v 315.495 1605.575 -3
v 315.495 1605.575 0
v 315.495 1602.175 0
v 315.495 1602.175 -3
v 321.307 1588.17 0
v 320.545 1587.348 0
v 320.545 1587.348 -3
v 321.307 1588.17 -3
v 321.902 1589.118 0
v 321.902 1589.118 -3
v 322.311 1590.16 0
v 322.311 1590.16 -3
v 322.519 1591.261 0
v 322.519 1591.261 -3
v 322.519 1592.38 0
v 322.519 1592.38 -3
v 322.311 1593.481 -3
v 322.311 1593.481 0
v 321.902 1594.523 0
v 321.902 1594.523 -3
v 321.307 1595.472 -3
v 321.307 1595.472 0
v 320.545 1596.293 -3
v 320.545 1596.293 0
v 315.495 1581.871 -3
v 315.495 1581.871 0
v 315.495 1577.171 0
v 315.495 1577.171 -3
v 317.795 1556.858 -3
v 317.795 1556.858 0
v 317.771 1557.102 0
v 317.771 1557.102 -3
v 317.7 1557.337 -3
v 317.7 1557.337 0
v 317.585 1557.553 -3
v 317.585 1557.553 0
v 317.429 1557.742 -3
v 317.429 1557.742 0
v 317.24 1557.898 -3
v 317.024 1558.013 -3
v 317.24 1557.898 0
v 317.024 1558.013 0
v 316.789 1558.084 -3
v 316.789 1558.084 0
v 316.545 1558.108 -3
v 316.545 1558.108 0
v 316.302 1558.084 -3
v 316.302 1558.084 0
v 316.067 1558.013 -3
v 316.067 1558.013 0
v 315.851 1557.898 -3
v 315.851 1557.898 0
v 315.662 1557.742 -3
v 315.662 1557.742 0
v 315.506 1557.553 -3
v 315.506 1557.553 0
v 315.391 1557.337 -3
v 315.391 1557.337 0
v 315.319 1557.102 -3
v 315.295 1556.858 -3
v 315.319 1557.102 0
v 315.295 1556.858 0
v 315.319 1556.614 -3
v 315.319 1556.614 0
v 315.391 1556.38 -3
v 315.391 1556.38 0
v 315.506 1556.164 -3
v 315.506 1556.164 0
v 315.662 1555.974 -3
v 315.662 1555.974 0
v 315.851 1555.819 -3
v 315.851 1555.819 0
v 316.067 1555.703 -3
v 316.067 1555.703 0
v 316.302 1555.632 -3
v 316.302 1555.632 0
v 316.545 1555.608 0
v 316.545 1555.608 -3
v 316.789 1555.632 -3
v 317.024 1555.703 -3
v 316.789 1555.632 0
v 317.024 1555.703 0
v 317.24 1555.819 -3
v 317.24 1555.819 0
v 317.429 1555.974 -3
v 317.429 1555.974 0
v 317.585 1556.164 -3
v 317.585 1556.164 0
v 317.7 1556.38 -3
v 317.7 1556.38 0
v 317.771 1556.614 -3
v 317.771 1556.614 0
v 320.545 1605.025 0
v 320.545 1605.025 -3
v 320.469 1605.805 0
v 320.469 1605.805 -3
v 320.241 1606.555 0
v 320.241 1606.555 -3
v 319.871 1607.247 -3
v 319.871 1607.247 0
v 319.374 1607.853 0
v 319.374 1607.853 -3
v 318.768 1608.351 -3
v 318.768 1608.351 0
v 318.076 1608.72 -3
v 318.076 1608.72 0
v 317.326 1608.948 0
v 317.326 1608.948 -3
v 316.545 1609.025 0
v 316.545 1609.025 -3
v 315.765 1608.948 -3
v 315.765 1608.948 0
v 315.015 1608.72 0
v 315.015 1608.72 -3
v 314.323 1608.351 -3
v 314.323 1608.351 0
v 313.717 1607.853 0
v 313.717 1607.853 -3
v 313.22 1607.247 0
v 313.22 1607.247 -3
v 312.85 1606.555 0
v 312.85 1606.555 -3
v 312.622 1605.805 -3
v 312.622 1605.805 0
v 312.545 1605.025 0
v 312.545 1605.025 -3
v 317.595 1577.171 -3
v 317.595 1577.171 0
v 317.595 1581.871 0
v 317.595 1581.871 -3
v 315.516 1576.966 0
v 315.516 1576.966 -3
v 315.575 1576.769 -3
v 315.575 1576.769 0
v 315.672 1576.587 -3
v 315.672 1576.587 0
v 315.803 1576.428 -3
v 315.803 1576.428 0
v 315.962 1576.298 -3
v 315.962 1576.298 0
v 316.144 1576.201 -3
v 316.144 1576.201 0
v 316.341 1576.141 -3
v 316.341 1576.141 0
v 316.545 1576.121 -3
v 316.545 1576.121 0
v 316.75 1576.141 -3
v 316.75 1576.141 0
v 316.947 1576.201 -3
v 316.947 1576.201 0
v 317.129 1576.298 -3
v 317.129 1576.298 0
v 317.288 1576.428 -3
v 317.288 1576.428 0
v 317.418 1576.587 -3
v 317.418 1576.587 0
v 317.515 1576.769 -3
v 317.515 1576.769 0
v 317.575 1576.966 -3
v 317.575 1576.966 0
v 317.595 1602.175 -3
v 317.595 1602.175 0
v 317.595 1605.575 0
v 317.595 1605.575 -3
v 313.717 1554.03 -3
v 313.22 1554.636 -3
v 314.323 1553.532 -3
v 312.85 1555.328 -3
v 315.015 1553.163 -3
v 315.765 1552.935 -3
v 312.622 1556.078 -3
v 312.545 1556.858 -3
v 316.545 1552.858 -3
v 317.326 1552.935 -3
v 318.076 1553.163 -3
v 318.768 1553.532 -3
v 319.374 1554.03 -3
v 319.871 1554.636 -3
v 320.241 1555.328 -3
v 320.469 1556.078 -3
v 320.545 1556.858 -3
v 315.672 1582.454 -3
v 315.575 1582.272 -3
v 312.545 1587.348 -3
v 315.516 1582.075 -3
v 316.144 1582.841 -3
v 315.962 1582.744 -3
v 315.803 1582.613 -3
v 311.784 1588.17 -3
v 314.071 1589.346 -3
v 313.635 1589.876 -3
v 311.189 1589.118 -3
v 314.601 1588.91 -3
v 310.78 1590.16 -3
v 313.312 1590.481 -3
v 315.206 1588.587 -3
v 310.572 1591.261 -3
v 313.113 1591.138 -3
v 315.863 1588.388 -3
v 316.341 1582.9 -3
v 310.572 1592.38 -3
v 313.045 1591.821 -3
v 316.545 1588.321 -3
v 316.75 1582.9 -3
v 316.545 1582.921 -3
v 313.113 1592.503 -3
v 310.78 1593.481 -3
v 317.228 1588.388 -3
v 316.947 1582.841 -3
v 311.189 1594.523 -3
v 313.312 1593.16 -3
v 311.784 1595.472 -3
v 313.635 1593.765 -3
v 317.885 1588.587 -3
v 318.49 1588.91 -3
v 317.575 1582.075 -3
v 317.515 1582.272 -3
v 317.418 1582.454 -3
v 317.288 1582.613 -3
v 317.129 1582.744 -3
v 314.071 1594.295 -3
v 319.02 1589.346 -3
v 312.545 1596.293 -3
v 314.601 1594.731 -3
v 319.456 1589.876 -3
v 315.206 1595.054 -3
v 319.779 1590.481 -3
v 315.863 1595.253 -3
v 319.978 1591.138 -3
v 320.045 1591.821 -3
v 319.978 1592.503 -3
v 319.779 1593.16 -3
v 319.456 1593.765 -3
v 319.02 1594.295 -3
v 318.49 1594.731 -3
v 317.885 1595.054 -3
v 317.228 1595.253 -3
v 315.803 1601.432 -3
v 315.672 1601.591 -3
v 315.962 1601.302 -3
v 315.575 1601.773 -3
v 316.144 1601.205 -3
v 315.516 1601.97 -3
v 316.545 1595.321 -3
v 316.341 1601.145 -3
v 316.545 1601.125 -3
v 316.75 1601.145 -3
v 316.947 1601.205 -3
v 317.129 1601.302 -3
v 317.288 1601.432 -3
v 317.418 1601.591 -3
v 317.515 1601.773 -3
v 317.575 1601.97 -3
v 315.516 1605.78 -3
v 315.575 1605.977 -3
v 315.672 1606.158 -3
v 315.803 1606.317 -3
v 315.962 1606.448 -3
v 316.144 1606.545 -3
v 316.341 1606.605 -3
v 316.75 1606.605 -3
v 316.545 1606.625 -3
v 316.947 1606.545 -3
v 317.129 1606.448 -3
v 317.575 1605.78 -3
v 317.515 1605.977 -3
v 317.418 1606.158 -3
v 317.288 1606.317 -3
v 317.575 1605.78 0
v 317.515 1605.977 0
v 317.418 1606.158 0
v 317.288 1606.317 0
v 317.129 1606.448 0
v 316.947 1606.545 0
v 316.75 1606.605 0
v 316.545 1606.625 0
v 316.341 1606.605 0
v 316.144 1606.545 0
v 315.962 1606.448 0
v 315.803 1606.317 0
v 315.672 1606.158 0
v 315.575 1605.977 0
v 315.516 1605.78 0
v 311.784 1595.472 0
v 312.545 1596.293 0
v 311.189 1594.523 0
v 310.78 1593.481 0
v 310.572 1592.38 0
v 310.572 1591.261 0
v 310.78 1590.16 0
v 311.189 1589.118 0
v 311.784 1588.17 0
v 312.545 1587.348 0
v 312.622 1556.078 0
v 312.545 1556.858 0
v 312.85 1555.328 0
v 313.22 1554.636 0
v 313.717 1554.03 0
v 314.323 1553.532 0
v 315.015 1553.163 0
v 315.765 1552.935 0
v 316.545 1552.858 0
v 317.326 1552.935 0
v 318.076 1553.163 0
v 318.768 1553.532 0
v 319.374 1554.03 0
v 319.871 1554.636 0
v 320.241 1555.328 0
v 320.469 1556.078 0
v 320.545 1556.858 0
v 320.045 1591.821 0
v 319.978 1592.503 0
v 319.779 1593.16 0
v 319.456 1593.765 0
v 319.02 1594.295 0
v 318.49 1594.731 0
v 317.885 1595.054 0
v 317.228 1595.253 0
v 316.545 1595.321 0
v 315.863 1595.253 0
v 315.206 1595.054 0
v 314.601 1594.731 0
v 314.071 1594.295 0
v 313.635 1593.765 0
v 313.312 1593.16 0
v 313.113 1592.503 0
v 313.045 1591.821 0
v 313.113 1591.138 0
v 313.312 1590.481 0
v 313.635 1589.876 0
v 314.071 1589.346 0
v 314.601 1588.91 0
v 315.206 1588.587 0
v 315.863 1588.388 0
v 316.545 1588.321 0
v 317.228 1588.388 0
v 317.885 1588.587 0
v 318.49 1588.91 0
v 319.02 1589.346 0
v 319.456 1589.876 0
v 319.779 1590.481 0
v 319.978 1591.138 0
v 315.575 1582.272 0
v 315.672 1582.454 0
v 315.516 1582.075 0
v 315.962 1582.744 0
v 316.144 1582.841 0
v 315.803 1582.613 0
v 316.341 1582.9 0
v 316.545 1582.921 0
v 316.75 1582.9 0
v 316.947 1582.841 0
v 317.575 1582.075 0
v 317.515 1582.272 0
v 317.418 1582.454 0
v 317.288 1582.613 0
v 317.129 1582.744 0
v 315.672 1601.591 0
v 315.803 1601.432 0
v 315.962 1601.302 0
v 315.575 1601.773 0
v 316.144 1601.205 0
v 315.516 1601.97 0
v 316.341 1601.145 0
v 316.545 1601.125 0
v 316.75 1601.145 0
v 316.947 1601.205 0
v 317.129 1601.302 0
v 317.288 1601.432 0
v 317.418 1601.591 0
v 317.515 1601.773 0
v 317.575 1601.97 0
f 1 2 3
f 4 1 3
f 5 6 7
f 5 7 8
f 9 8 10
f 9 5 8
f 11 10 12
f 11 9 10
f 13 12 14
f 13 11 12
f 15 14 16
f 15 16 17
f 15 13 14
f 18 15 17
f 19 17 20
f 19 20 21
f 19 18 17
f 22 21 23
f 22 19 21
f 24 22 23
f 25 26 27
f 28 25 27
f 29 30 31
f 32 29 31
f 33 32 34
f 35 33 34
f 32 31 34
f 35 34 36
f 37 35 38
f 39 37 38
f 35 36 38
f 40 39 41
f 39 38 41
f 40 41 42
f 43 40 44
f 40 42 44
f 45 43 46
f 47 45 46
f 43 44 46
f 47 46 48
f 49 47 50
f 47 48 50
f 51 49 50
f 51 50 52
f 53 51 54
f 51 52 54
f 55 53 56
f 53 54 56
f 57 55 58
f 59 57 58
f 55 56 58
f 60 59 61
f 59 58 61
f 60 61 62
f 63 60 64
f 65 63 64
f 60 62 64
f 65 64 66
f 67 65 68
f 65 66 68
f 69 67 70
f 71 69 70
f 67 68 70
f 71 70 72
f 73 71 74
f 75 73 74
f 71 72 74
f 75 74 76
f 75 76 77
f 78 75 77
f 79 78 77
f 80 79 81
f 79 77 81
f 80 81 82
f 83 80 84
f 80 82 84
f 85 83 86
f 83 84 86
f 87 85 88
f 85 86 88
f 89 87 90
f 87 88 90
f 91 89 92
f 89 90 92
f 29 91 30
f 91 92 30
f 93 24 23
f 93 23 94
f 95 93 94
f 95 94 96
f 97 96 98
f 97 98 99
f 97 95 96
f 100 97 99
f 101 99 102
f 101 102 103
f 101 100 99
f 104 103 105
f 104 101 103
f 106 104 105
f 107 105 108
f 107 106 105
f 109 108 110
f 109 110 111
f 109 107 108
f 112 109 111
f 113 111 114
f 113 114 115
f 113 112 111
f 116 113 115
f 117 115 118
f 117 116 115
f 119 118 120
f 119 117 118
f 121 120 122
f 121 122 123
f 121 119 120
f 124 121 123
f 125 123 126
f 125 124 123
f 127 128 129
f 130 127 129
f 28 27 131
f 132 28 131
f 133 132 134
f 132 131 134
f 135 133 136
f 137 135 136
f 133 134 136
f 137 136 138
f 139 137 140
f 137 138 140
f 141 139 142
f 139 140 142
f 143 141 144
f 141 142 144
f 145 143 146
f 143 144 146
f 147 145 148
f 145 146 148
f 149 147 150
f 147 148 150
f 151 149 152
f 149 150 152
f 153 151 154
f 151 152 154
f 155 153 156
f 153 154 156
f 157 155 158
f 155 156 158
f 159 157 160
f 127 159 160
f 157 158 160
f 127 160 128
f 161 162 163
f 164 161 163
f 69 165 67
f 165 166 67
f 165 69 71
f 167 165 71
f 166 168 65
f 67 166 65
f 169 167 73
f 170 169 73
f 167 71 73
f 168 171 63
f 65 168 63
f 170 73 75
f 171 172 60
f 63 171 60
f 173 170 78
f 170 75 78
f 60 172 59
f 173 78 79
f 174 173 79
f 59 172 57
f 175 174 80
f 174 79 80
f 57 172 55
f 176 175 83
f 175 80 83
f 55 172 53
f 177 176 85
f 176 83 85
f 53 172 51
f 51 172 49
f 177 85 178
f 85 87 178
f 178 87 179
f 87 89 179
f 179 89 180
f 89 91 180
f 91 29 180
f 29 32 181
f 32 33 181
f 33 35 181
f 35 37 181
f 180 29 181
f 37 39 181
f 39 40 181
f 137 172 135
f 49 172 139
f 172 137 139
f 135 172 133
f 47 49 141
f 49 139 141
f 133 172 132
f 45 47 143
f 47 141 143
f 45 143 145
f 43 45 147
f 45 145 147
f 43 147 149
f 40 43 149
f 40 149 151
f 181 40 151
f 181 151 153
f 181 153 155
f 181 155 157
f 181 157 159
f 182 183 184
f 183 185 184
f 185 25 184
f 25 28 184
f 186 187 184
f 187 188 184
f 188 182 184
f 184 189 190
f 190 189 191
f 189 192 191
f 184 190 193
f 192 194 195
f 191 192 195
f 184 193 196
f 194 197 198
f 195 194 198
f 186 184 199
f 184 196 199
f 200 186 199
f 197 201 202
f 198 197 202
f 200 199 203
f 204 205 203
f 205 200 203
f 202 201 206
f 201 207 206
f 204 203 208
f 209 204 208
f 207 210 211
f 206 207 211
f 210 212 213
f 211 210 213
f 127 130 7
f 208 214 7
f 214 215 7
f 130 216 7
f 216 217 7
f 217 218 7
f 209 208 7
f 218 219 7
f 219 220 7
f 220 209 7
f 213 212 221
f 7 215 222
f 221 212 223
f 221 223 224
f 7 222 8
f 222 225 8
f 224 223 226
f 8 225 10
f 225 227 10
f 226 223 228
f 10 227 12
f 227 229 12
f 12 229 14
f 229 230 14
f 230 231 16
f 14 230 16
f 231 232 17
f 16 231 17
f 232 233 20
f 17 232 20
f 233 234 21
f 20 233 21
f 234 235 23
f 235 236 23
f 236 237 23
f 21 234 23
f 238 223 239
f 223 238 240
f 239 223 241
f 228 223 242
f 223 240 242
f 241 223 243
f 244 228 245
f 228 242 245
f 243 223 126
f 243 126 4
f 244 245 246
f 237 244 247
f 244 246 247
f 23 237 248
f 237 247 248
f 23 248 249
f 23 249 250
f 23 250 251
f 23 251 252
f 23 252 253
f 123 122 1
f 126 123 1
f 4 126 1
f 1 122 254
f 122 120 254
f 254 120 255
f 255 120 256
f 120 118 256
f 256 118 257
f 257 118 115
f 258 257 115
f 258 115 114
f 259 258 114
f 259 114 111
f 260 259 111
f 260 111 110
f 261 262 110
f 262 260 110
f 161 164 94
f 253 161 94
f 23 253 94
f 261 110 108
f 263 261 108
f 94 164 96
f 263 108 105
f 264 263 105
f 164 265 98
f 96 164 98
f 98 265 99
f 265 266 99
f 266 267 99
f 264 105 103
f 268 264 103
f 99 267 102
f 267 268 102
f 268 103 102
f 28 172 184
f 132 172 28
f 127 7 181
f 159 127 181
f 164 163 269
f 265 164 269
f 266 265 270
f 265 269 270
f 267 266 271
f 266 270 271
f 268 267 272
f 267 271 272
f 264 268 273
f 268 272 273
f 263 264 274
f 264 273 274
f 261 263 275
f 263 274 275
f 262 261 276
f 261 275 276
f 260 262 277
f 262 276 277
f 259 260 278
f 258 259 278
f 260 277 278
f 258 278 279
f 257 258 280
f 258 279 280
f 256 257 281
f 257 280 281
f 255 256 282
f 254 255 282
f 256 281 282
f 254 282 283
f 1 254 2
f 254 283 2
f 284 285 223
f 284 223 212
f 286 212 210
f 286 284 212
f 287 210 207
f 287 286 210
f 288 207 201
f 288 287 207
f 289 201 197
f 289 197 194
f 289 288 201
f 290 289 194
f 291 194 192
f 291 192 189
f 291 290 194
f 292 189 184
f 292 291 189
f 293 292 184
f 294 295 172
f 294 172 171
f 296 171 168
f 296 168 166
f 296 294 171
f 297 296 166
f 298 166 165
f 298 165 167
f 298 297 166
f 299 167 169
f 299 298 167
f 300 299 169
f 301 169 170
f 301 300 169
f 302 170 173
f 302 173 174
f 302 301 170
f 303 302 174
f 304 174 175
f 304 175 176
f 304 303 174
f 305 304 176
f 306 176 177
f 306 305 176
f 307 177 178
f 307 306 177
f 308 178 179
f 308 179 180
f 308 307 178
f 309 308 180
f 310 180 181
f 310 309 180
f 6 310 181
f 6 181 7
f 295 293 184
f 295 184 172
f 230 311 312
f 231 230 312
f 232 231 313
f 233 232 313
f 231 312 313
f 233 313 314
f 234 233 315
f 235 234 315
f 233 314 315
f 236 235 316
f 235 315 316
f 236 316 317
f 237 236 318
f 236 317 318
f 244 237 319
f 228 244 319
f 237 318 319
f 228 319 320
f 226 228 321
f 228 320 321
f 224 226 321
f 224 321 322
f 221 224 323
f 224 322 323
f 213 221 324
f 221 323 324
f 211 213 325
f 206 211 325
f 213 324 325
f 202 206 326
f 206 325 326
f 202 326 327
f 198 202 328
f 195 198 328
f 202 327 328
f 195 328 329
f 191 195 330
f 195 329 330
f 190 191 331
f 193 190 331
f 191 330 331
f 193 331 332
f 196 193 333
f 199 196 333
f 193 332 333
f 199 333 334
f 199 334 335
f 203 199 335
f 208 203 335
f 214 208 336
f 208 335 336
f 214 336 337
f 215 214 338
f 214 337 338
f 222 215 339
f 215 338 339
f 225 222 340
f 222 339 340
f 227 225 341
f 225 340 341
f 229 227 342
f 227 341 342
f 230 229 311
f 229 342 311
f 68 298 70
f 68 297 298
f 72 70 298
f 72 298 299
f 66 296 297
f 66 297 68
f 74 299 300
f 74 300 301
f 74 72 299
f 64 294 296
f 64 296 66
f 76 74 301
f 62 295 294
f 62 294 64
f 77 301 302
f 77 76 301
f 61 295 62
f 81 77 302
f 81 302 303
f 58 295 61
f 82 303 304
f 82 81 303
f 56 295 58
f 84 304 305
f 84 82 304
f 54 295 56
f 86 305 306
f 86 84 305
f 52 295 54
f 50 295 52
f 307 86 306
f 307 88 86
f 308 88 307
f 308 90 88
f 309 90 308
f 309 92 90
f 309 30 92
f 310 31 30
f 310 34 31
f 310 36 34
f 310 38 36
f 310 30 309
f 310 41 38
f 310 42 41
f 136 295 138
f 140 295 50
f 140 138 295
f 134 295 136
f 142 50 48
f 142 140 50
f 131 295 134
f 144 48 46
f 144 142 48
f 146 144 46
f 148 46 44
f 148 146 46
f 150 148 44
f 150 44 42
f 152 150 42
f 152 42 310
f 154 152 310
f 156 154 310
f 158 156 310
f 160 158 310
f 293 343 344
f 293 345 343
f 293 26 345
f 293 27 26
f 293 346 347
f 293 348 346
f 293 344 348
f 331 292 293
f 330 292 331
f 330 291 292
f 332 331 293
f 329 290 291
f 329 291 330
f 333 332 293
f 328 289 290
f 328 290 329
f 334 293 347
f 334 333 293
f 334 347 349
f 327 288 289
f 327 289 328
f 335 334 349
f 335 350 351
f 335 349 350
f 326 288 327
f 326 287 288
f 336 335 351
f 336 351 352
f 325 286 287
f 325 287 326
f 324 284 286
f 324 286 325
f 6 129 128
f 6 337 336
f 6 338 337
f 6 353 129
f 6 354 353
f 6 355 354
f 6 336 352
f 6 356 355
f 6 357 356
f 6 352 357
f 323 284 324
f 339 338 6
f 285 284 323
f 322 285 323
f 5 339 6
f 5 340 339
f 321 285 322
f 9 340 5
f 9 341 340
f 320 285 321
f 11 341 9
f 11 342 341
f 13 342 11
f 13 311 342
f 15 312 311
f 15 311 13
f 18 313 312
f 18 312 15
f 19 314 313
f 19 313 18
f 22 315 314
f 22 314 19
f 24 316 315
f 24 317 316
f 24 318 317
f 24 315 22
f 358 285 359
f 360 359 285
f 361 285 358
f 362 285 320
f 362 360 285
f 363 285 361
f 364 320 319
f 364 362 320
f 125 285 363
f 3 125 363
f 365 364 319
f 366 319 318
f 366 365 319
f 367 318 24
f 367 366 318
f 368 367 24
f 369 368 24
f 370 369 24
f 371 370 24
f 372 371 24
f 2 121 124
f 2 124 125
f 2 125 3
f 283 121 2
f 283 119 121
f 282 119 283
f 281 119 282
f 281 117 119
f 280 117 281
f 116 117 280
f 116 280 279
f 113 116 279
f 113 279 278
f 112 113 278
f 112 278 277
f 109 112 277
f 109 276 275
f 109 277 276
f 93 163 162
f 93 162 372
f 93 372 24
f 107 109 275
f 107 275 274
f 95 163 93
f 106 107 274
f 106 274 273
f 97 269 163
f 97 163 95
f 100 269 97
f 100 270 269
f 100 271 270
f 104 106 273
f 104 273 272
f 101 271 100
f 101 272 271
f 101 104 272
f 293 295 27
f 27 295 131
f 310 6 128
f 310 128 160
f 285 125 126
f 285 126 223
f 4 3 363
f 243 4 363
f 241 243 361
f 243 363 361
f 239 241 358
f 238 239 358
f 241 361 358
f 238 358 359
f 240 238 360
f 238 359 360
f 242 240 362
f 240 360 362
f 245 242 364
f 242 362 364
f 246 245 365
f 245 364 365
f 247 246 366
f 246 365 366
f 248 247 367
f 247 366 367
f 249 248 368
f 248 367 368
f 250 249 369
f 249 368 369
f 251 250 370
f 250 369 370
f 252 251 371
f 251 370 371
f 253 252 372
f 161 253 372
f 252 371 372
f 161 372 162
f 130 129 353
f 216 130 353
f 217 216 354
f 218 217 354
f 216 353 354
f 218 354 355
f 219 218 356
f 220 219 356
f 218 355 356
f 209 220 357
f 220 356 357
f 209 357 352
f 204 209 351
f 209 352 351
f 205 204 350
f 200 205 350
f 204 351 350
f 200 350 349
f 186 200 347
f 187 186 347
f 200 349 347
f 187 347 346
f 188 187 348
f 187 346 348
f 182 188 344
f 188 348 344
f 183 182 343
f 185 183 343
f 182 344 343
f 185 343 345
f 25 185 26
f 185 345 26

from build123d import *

# Parameters (mm, degrees)
ESQUISSE1_R               = 3.5
ESQUISSE1_R_2             = 1.25
T_LE_DE_BASE_PLI_E1_DEPTH = 3


# Sheet-metal steps are written as plain solids
with BuildPart() as part:
    # Esquisse1 → Tôle de base pliée1 (new body)
    with BuildSketch(Plane.XY):
        with BuildLine():
            Line((312.545394727, 1587.348462935), (312.545394727, 1556.858242671))
            ThreePointArc((312.545394727, 1556.858242671), (316.545394727, 1552.858242671), (320.545394727, 1556.858242671))
            Line((320.545394727, 1556.858242671), (320.545394727, 1587.348462935))
            ThreePointArc((320.545394727, 1587.348462935), (322.545394727, 1591.82059889), (320.545394727, 1596.292734845))
            Line((320.545394727, 1596.292734845), (320.545394727, 1605.02468454))
            ThreePointArc((320.545394727, 1605.02468454), (316.545394727, 1609.02468454), (312.545394727, 1605.02468454))
            Line((312.545394727, 1605.02468454), (312.545394727, 1596.292734845))
            ThreePointArc((312.545394727, 1596.292734845), (310.545394727, 1591.82059889), (312.545394727, 1587.348462935))
        make_face()
        with Locations((316.545394727, 1591.82059889)):
            Circle(ESQUISSE1_R, mode=Mode.SUBTRACT)
        with Locations((316.545394727, 1556.858242671)):
            Circle(ESQUISSE1_R_2, mode=Mode.SUBTRACT)
        with BuildLine():
            Line((315.495394727, 1605.57468454), (315.495394727, 1602.17468454))
            ThreePointArc((315.495394727, 1602.17468454), (316.545394727, 1601.12468454), (317.595394727, 1602.17468454))
            Line((317.595394727, 1602.17468454), (317.595394727, 1605.57468454))
            ThreePointArc((317.595394727, 1605.57468454), (316.545394727, 1606.62468454), (315.495394727, 1605.57468454))
        make_face(mode=Mode.SUBTRACT)
        with BuildLine():
            Line((315.495394727, 1581.87059889), (315.495394727, 1577.17059889))
            ThreePointArc((315.495394727, 1577.17059889), (316.545394727, 1576.12059889), (317.595394727, 1577.17059889))
            Line((317.595394727, 1577.17059889), (317.595394727, 1581.87059889))
            ThreePointArc((317.595394727, 1581.87059889), (316.545394727, 1582.92059889), (315.495394727, 1581.87059889))
        make_face(mode=Mode.SUBTRACT)
    extrude(amount=-T_LE_DE_BASE_PLI_E1_DEPTH)


solid = part.part
